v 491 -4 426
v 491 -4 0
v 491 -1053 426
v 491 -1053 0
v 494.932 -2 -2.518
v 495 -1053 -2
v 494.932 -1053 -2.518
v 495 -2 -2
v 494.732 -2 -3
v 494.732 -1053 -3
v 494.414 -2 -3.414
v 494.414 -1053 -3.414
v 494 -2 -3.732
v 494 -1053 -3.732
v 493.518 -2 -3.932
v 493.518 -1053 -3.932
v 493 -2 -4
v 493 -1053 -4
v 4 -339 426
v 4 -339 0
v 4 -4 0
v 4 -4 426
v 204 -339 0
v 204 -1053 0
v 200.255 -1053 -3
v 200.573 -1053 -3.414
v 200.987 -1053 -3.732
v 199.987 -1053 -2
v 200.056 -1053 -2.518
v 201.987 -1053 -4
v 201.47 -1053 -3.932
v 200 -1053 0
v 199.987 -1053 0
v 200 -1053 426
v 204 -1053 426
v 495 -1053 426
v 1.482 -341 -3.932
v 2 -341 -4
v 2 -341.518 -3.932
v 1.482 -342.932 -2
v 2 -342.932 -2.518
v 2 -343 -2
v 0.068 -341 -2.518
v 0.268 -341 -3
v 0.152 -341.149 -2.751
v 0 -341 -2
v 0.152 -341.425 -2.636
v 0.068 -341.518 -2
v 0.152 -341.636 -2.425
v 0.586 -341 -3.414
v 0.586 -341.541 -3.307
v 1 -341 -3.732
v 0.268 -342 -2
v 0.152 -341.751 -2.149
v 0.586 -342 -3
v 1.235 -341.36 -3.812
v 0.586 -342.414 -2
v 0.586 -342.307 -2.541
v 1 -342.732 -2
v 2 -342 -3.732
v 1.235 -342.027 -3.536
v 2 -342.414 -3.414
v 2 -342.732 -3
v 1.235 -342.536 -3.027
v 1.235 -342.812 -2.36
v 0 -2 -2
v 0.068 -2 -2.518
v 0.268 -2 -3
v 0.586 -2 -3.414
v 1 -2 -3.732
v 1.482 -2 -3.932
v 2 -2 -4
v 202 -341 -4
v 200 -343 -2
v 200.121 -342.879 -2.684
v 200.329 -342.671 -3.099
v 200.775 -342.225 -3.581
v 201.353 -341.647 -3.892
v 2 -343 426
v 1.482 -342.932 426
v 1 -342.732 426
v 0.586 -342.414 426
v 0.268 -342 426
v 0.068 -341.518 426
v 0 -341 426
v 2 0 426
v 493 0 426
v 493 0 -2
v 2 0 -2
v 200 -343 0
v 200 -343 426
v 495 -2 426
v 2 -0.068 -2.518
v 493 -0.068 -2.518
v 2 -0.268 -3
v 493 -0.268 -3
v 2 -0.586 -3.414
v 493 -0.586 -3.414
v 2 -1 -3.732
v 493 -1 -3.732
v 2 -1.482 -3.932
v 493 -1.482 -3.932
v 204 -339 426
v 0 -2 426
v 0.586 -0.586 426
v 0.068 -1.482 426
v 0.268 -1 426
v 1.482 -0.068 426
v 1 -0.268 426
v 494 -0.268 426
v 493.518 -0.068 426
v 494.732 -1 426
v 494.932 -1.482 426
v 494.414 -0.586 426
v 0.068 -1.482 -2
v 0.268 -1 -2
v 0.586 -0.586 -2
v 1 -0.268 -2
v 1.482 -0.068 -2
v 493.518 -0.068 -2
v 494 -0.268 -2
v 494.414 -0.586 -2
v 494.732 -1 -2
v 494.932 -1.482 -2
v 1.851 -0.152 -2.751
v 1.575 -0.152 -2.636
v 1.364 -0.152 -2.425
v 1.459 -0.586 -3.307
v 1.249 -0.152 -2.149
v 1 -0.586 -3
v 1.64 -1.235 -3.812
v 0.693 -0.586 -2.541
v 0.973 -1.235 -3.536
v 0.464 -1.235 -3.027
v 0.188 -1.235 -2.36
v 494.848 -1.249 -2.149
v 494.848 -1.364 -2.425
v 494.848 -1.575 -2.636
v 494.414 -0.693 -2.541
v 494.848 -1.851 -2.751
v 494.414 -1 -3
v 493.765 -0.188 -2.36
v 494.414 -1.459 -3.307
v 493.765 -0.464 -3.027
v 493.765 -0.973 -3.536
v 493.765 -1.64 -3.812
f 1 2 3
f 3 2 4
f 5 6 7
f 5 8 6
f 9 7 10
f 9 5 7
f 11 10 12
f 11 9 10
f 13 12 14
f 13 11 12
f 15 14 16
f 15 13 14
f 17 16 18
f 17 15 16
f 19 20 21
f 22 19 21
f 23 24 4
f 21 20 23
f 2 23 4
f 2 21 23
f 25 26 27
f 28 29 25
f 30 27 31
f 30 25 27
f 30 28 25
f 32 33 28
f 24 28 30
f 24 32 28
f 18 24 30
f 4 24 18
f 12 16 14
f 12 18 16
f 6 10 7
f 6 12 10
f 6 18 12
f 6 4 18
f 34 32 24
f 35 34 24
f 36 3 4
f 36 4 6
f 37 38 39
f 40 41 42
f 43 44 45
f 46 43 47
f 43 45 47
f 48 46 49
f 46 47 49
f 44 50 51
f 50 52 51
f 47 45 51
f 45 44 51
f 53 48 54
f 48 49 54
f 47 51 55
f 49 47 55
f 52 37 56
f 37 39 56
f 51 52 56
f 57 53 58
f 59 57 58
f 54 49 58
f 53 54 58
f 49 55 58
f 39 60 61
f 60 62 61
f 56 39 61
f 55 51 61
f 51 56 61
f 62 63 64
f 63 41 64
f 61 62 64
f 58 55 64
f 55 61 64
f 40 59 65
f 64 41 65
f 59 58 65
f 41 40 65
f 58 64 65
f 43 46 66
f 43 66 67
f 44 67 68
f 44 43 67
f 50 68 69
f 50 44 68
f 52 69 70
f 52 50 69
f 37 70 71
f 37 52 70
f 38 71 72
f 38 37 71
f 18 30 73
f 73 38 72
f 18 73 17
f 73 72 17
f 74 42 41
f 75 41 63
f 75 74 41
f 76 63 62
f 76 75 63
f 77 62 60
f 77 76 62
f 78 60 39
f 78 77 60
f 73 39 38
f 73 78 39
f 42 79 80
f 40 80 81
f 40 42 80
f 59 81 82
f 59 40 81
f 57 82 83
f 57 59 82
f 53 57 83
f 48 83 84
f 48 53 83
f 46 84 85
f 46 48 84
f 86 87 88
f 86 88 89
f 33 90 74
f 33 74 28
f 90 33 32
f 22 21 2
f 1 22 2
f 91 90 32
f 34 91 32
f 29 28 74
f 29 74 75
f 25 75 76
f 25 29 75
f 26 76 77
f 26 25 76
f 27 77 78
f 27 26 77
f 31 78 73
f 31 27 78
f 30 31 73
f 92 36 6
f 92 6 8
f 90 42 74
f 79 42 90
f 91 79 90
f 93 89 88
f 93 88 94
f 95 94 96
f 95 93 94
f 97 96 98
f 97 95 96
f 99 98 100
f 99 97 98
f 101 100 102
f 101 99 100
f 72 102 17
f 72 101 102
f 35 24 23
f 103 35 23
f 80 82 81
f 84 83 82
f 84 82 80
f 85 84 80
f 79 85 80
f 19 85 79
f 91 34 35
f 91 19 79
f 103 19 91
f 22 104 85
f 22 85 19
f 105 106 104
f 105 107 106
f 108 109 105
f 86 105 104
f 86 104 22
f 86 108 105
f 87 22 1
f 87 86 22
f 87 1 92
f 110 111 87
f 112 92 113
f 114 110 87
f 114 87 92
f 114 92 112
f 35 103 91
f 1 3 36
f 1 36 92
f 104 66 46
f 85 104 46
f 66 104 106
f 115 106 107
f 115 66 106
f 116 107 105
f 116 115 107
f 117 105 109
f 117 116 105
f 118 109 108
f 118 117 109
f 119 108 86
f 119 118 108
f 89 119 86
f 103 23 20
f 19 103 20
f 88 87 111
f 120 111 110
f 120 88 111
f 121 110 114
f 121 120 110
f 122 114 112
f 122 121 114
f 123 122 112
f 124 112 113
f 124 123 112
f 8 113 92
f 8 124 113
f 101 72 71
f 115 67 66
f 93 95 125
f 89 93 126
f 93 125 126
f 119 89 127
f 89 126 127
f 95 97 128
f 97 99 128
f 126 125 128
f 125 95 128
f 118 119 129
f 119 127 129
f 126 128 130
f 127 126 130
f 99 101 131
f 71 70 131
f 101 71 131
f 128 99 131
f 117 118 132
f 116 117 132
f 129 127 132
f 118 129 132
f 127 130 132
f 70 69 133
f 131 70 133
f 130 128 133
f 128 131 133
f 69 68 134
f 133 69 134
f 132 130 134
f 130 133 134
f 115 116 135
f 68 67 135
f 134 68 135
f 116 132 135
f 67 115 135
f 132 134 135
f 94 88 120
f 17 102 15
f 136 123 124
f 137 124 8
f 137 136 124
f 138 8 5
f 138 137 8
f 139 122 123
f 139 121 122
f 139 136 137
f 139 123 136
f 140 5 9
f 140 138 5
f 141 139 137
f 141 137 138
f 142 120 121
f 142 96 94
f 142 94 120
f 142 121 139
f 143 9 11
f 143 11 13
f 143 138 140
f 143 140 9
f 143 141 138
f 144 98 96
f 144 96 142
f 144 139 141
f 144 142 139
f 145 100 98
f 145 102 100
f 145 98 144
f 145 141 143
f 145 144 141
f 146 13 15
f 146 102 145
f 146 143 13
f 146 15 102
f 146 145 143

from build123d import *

# Parameters (mm, degrees)
F1_DEPTH = 426
F3_DEPTH = 4
F4_R     = 2


# Not quite as in the source:
# - a feature names something its author has since deleted; it is built from what else it names


with BuildPart() as f1:
    # F0 (on Top) → F1 (new body)
    with BuildSketch(Plane.XY):
        Polygon((495, 0), (0, 0), (0, -343), (200, -343), (200, -1053), (204, -1053), (204, -339), (4, -339), (4, -4), (491, -4), (491, -1053), (495, -1053), align=None)
    extrude(amount=F1_DEPTH)

    # F2 (on Top) → F3 (join)
    with BuildSketch(Plane.XY):
        Polygon((0, -343), (200, -343), (199.9874711037, -1053), (495, -1053), (495, 0), (0, 0), align=None)
    extrude(amount=-F3_DEPTH)

    # F4
    f4_edges = [f1.edges().sort_by_distance(p)[0] for p in [
        (100, -343, -4),
        (0, -171.5, -4),
        (247.5, 0, -4),
        (0, -343, 211),
        (0, 0, 211),
        (495, 0, 211),
        (199.993736, -698, -4),
        (495, -526.5, -4),
    ]]
    fillet(f4_edges, radius=F4_R)


solid = f1.part
